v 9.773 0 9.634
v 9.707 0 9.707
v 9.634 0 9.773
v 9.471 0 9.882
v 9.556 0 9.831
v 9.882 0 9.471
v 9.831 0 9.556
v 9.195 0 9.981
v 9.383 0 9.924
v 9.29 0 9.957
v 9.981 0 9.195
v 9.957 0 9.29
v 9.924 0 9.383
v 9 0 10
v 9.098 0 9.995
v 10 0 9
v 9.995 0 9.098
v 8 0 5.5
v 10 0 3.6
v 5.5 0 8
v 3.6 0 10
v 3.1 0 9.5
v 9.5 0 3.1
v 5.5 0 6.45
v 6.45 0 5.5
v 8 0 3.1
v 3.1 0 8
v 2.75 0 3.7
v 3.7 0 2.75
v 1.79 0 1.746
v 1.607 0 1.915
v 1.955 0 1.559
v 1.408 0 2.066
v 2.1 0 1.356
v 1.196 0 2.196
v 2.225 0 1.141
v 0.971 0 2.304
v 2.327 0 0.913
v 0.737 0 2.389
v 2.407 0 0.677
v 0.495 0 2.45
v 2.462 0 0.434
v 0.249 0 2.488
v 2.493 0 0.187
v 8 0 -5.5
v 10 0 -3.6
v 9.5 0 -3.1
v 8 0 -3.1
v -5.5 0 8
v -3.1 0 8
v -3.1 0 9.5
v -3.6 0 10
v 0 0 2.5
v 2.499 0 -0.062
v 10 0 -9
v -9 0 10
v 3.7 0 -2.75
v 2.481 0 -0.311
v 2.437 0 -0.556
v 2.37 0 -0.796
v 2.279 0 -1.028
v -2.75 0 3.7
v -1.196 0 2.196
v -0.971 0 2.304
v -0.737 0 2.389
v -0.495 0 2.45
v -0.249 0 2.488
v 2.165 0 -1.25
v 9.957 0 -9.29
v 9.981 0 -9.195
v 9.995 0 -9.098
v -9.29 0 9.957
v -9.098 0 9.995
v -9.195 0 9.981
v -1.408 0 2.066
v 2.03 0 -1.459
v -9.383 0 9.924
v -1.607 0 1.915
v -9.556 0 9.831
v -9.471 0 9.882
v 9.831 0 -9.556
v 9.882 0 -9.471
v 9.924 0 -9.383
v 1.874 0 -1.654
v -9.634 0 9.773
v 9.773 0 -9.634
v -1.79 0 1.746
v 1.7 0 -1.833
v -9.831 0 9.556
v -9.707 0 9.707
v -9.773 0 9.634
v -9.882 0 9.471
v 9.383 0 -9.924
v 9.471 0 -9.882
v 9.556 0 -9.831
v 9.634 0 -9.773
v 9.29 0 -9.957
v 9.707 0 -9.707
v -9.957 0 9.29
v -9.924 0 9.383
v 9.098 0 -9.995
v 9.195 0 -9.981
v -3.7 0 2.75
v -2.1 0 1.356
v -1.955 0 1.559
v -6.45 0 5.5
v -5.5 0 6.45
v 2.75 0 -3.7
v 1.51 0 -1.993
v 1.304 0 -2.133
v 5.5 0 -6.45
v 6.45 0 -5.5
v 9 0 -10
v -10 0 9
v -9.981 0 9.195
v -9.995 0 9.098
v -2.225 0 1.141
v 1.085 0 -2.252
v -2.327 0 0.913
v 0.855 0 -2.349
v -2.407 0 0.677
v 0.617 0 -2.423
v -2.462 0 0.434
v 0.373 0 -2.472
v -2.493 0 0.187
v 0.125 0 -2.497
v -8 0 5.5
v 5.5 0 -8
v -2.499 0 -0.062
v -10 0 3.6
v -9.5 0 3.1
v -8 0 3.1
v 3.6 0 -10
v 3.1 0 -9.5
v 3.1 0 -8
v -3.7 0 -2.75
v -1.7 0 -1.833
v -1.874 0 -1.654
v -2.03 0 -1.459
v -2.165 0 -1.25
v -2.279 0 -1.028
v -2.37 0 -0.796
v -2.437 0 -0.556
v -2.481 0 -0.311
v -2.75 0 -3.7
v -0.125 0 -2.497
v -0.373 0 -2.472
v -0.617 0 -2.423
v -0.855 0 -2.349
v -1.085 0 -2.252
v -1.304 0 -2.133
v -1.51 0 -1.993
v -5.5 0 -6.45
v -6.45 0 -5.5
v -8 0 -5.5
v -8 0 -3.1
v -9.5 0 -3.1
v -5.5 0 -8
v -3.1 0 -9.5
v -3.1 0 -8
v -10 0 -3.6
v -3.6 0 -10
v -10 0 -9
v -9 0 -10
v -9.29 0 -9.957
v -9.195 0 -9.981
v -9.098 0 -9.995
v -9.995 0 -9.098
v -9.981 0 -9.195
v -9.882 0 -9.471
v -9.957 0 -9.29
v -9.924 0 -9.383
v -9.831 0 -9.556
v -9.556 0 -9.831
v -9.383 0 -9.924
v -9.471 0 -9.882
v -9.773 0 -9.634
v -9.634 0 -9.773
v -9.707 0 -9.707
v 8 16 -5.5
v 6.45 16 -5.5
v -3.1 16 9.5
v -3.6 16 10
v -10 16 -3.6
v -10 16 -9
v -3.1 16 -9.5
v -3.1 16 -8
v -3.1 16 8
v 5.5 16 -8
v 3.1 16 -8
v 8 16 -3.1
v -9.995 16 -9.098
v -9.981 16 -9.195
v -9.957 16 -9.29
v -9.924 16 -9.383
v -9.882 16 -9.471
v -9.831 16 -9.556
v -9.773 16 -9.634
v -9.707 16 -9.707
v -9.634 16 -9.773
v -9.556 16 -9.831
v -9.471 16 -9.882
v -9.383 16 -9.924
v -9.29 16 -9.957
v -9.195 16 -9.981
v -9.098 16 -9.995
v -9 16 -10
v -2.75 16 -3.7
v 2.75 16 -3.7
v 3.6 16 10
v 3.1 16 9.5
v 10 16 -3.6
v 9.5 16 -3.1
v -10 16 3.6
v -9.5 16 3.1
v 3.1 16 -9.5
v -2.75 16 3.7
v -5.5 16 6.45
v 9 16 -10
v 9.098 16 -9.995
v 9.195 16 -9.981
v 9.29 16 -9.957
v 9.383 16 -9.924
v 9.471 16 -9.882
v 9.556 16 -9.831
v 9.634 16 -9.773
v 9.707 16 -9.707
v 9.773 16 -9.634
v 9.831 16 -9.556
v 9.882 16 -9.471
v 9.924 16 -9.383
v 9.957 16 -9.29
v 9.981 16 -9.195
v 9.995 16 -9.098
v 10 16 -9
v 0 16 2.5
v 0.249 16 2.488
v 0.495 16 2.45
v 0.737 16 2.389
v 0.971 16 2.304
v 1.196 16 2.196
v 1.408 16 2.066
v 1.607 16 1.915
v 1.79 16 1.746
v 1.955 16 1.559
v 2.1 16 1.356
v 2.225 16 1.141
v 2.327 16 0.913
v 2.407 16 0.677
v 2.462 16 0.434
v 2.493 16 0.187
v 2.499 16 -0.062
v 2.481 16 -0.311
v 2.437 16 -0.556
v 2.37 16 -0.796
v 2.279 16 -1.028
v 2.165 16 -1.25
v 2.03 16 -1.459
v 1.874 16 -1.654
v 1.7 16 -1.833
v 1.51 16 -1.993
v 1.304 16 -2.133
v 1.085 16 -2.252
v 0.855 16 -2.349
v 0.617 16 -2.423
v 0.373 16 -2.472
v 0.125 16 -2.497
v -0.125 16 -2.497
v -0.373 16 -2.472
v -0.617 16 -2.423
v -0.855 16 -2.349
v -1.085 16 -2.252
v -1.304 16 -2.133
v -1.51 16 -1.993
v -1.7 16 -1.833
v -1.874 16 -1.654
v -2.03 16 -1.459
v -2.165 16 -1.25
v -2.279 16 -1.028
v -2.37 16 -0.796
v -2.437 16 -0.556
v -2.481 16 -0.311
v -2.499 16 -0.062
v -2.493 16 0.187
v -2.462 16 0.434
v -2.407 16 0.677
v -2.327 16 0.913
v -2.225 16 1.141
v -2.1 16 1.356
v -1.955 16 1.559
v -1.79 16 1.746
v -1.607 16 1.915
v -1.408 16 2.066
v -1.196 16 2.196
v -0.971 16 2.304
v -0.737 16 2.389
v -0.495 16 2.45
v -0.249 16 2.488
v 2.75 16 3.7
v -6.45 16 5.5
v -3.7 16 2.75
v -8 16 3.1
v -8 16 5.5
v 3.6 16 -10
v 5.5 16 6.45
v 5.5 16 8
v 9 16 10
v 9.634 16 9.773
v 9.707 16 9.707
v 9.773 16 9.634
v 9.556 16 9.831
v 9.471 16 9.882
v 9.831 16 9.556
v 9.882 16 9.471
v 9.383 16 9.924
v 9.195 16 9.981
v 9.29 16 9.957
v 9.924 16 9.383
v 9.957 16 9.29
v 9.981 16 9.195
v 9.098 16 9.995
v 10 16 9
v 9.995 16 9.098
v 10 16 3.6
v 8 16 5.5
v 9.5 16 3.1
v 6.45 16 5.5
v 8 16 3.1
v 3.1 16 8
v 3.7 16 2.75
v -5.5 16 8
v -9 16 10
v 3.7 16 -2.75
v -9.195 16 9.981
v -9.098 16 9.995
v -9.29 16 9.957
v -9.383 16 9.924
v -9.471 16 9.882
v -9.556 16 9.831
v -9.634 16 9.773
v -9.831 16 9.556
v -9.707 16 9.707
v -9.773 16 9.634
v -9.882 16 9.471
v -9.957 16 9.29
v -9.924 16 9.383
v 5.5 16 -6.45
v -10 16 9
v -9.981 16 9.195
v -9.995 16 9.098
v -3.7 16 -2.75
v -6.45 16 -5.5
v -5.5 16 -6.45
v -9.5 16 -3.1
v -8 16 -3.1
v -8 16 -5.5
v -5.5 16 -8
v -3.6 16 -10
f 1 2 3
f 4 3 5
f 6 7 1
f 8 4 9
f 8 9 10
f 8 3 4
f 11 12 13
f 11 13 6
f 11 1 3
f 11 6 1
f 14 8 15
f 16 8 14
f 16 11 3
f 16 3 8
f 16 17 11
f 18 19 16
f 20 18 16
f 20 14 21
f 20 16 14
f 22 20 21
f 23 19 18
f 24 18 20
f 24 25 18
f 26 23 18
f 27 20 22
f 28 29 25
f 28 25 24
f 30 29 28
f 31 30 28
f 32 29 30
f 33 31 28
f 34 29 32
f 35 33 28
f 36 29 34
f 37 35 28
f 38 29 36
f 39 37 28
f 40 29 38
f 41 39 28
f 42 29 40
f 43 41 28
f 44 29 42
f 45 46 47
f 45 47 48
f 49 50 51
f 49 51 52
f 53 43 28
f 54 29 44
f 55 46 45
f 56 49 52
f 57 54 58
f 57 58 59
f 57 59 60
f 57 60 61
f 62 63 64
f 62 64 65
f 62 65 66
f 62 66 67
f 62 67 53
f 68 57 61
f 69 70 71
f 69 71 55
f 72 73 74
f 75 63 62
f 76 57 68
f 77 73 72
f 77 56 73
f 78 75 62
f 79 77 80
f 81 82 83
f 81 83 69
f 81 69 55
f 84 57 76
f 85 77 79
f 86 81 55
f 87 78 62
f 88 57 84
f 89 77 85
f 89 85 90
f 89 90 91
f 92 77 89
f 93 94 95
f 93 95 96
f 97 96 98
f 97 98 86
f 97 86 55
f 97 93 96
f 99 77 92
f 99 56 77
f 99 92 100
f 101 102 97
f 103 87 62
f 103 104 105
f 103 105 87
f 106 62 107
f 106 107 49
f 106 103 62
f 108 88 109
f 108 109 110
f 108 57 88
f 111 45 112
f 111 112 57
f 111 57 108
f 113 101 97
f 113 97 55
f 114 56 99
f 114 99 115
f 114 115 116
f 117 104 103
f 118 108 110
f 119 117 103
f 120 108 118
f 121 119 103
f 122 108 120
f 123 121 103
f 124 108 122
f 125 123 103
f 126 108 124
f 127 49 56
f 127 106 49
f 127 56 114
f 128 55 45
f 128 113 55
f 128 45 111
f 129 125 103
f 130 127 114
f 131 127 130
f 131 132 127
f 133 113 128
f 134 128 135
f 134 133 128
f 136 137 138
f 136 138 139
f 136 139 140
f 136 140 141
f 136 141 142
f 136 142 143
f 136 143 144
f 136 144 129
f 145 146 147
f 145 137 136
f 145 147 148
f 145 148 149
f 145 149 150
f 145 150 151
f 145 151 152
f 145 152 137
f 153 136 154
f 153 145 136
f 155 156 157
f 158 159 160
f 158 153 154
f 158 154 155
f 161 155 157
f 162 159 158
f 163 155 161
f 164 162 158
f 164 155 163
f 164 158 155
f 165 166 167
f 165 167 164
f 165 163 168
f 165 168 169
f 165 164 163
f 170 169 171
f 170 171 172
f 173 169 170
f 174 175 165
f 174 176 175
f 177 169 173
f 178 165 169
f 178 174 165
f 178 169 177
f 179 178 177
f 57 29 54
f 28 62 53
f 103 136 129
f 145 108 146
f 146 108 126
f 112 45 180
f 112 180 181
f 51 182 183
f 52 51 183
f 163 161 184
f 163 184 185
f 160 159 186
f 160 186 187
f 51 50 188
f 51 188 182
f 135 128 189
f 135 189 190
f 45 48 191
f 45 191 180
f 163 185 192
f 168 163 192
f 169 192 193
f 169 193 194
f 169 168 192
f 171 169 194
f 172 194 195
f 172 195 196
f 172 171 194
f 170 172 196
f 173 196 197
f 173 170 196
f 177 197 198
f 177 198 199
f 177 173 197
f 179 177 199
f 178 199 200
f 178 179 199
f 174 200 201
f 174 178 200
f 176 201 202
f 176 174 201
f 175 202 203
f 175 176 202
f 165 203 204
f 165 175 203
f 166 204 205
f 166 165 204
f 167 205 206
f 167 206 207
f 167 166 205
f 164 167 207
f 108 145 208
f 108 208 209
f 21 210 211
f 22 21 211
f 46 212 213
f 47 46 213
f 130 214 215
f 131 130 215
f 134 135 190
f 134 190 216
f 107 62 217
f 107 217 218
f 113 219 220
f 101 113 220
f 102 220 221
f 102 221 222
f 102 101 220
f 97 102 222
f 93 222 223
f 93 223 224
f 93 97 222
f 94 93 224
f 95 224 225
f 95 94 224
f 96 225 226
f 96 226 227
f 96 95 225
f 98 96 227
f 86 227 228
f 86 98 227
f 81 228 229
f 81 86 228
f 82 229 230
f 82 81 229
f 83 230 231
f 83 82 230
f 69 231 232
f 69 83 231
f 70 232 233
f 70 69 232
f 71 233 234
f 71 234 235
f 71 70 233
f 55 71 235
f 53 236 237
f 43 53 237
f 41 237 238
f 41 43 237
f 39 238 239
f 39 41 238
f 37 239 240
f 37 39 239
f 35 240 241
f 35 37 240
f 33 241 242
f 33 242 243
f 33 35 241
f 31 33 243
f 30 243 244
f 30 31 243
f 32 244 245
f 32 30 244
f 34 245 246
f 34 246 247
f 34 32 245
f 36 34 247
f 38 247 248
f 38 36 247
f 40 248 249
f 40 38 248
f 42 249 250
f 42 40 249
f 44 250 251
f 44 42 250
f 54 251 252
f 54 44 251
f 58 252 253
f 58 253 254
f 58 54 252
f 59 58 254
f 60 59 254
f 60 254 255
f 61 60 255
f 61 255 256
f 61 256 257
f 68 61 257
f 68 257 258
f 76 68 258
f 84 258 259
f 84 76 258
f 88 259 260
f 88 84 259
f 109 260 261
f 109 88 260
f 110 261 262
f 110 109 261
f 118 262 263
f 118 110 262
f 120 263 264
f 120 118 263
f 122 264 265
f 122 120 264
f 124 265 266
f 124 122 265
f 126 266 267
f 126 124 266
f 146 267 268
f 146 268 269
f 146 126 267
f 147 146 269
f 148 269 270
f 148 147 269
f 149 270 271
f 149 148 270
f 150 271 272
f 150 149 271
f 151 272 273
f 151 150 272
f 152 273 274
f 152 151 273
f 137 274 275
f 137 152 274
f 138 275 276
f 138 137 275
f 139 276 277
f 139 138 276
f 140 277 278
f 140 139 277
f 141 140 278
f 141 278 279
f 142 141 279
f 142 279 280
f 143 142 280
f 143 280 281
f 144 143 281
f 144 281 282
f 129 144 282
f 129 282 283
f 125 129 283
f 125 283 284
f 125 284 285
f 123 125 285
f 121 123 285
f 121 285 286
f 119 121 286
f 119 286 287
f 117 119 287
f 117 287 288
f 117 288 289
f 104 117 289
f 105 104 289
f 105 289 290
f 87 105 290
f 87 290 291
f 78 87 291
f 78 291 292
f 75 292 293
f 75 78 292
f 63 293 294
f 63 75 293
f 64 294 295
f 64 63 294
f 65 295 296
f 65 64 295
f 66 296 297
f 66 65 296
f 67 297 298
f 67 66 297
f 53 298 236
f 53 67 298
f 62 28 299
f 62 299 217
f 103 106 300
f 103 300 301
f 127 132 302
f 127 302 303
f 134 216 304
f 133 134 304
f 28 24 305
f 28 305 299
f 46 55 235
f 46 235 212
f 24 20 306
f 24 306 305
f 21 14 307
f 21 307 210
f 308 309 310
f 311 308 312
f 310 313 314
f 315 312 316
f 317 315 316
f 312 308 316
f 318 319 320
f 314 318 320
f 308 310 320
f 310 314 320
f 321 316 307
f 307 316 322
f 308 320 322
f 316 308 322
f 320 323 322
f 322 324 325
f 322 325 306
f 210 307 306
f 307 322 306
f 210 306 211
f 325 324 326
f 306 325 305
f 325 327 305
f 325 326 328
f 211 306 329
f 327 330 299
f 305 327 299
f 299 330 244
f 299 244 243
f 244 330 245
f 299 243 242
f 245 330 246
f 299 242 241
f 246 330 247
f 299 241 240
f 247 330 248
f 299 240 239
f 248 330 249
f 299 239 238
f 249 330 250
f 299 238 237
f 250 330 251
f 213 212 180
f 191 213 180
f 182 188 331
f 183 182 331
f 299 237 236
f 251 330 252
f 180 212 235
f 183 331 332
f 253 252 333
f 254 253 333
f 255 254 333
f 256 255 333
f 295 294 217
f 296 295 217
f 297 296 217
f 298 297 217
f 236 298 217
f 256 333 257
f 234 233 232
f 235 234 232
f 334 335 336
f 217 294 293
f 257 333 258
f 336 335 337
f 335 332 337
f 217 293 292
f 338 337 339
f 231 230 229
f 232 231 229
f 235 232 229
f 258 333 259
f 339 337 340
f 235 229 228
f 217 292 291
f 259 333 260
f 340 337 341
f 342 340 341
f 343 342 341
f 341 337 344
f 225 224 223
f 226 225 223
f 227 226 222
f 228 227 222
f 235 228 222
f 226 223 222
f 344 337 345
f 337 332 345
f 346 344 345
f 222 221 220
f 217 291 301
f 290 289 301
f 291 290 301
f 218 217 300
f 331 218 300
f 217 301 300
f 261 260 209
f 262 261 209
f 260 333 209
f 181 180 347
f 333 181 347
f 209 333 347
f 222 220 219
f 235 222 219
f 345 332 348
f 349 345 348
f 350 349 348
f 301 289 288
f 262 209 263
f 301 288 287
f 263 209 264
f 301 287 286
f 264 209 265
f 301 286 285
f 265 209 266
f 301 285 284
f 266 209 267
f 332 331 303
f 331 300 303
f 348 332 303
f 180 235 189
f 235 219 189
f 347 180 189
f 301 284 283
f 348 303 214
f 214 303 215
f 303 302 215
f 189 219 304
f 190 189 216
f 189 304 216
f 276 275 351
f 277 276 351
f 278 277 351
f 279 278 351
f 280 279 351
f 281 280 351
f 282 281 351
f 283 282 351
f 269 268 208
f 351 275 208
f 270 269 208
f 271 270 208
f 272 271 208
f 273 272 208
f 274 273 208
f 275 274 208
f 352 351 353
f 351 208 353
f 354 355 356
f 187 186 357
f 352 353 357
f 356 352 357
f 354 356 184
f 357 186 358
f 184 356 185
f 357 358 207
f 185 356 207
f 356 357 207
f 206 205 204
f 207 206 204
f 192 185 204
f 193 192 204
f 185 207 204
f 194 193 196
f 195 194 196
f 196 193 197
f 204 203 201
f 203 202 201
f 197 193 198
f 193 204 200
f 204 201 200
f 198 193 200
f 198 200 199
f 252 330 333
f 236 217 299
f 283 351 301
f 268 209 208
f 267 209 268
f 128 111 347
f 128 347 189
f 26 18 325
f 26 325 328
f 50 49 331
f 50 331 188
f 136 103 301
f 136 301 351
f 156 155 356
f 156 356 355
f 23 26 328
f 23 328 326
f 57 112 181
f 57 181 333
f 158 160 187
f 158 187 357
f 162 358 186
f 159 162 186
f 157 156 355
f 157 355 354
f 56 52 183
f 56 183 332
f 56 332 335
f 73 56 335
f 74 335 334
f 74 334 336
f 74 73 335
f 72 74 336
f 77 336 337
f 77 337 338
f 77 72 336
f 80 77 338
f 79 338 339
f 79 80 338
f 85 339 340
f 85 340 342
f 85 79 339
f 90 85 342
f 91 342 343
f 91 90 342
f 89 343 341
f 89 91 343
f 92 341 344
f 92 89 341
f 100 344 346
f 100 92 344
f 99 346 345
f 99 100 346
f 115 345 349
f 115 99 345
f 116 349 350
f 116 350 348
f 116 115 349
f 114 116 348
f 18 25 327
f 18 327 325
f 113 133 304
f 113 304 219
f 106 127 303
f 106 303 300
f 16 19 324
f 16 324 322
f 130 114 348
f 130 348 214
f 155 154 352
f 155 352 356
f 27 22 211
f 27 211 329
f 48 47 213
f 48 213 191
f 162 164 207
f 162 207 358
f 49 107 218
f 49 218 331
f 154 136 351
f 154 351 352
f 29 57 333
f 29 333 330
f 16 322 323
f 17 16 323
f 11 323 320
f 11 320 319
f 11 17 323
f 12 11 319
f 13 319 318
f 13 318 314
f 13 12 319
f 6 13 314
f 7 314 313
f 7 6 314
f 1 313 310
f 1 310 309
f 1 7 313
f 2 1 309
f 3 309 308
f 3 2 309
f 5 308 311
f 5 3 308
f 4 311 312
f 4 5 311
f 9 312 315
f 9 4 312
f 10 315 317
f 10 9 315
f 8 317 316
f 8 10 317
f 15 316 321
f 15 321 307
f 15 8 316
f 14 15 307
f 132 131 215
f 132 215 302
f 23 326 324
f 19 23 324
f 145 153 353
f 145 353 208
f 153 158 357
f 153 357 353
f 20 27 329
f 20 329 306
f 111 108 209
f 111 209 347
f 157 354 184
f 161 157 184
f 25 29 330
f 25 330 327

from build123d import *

# Parameters (mm, degrees)
SKETCH1_R           = 2.5
BOSS_EXTRUDE1_DEPTH = 16


with BuildPart() as part:
    # Sketch1 → Boss-Extrude1 (new body)
    with BuildSketch(Plane(origin=(0, 0, 0), x_dir=(1, 0, 0), z_dir=(0, 1, 0))):
        with BuildLine():
            Line((3.6, 10), (9, 10))
            ThreePointArc((9, 10), (9.707106781, 9.707106781), (10, 9))
            Line((10, 9), (10, 3.6))
            Line((10, 3.6), (9.5, 3.1))
            Line((9.5, 3.1), (8, 3.1))
            Line((8, 3.1), (8, 5.5))
            Line((8, 5.5), (6.45, 5.5))
            Line((6.45, 5.5), (3.7, 2.75))
            Line((3.7, 2.75), (3.7, -2.75))
            Line((3.7, -2.75), (6.45, -5.5))
            Line((6.45, -5.5), (8, -5.5))
            Line((8, -5.5), (8, -3.1))
            Line((8, -3.1), (9.5, -3.1))
            Line((9.5, -3.1), (10, -3.6))
            Line((10, -3.6), (10, -9))
            ThreePointArc((10, -9), (9.707106781, -9.707106781), (9, -10))
            Line((9, -10), (3.6, -10))
            Line((3.6, -10), (3.1, -9.5))
            Line((3.1, -9.5), (3.1, -8))
            Line((3.1, -8), (5.5, -8))
            Line((5.5, -8), (5.5, -6.45))
            Line((5.5, -6.45), (2.75, -3.7))
            Line((2.75, -3.7), (-2.75, -3.7))
            Line((-2.75, -3.7), (-5.5, -6.45))
            Line((-5.5, -6.45), (-5.5, -8))
            Line((-5.5, -8), (-3.1, -8))
            Line((-3.1, -8), (-3.1, -9.5))
            Line((-3.1, -9.5), (-3.6, -10))
            Line((-3.6, -10), (-9, -10))
            ThreePointArc((-9, -10), (-9.707106781, -9.707106781), (-10, -9))
            Line((-10, -9), (-10, -3.6))
            Line((-10, -3.6), (-9.5, -3.1))
            Line((-9.5, -3.1), (-8, -3.1))
            Line((-8, -3.1), (-8, -5.5))
            Line((-8, -5.5), (-6.45, -5.5))
            Line((-6.45, -5.5), (-3.7, -2.75))
            Line((-3.7, -2.75), (-3.7, 2.75))
            Line((-3.7, 2.75), (-6.45, 5.5))
            Line((-6.45, 5.5), (-8, 5.5))
            Line((-8, 5.5), (-8, 3.1))
            Line((-8, 3.1), (-9.5, 3.1))
            Line((-9.5, 3.1), (-10, 3.6))
            Line((-10, 3.6), (-10, 9))
            ThreePointArc((-10, 9), (-9.707106781, 9.707106781), (-9, 10))
            Line((-9, 10), (-3.6, 10))
            Line((-3.6, 10), (-3.1, 9.5))
            Line((-3.1, 9.5), (-3.1, 8))
            Line((-3.1, 8), (-5.5, 8))
            Line((-5.5, 8), (-5.5, 6.45))
            Line((-5.5, 6.45), (-2.75, 3.7))
            Line((-2.75, 3.7), (2.75, 3.7))
            Line((2.75, 3.7), (5.5, 6.45))
            Line((5.5, 6.45), (5.5, 8))
            Line((5.5, 8), (3.1, 8))
            Line((3.1, 8), (3.1, 9.5))
            Line((3.1, 9.5), (3.6, 10))
        make_face()
        with Locations(Location((0, 0, 0), (0, 0, 270))):
            Circle(SKETCH1_R, mode=Mode.SUBTRACT)
    extrude(amount=BOSS_EXTRUDE1_DEPTH)


solid = part.part
